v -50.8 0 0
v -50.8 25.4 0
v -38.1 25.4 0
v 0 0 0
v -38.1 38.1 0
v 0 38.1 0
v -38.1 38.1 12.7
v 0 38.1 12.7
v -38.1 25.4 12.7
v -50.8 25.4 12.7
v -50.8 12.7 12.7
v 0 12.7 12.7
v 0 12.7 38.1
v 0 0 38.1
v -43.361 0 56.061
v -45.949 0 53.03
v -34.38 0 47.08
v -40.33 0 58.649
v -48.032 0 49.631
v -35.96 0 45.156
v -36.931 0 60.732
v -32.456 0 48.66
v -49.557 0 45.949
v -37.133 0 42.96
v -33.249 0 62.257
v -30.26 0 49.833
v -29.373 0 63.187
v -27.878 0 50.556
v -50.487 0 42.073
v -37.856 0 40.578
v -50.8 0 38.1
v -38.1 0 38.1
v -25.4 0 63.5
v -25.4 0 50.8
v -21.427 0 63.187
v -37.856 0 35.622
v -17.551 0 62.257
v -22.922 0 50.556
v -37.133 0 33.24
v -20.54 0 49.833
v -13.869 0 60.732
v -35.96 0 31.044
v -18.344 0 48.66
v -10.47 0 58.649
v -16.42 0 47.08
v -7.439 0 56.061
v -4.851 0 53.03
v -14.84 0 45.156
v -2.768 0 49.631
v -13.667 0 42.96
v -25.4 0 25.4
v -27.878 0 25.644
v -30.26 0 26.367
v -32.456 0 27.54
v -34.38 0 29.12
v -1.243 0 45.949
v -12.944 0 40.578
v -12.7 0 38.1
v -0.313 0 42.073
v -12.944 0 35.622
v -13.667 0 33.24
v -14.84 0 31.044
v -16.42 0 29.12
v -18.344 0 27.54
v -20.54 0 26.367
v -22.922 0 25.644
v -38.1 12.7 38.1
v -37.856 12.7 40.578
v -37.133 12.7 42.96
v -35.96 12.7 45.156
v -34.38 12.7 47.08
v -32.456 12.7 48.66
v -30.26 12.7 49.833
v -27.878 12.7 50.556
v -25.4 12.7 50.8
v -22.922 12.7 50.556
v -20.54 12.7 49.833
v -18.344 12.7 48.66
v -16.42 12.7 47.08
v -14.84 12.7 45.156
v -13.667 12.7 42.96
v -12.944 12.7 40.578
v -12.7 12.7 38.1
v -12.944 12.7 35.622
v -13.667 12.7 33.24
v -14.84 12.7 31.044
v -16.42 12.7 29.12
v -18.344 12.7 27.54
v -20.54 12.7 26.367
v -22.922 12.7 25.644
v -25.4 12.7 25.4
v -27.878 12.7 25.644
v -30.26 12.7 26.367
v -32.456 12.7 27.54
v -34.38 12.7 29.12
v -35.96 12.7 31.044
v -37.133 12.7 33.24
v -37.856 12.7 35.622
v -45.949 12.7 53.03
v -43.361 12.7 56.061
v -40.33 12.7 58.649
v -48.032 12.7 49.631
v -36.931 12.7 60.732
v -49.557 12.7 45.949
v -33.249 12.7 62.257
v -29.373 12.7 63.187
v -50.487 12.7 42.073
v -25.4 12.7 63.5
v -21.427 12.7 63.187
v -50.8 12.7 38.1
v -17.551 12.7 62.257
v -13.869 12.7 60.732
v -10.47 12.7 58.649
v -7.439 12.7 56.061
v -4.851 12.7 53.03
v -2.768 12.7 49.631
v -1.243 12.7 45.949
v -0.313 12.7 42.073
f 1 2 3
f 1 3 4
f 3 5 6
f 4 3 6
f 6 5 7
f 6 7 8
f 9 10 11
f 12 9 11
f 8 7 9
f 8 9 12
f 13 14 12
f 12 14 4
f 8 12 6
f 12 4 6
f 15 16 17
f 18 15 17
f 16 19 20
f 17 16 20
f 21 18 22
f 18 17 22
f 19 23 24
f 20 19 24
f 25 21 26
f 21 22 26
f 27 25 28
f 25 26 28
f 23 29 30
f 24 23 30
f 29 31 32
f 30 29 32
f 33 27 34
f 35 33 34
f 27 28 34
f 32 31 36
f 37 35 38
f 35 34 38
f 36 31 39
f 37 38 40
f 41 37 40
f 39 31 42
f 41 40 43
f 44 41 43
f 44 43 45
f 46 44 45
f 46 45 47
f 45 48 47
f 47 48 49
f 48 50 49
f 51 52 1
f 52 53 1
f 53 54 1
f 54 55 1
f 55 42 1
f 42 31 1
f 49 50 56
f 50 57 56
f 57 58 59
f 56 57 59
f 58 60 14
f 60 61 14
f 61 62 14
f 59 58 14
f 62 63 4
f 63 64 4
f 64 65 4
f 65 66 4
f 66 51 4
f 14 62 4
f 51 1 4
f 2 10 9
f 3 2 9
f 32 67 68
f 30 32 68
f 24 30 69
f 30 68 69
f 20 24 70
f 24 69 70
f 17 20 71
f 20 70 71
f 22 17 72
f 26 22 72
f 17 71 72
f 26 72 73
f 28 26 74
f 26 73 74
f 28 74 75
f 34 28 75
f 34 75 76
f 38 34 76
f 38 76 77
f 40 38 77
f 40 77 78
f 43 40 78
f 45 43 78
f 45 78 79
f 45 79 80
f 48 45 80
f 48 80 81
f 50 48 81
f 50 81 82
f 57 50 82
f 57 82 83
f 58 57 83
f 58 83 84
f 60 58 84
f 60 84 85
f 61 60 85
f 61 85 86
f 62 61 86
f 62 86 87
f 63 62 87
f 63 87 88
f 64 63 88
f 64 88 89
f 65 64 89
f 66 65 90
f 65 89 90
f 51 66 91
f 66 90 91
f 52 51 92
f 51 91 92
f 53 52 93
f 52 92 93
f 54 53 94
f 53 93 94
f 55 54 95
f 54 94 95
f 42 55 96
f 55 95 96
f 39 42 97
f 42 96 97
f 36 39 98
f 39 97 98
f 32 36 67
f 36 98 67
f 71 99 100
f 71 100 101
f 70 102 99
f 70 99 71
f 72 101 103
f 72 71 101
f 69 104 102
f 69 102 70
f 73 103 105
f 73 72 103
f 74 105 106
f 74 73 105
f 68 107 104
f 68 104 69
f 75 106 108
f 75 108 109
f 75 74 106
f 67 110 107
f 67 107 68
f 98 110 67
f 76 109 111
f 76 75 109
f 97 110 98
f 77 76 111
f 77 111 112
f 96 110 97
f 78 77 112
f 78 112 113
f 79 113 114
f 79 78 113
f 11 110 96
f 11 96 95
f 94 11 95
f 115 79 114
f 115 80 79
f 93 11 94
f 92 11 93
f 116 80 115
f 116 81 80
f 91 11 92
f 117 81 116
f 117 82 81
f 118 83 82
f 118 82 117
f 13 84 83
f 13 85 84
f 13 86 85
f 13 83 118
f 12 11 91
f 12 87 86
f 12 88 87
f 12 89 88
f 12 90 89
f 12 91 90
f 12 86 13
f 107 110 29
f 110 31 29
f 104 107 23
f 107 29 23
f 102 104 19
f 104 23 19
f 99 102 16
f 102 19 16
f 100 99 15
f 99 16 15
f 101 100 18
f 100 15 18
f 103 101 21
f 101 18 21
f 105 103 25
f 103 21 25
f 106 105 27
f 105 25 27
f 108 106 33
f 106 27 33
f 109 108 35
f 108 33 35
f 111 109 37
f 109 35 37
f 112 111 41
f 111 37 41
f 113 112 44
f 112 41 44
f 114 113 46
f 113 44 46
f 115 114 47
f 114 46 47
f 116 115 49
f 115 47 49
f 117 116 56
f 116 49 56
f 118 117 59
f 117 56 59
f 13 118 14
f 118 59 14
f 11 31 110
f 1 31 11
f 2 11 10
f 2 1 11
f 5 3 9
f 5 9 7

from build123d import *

# Parameters (mm, degrees)
F0_W     = 50.8
F0_H     = 38.1
F1_DEPTH = 12.7
F2_W     = 50.8
F2_H     = 12.7
F3_DEPTH = 63.5
F4_W     = 12.7
F4_H     = 12.7
F5_DEPTH = 12.701
F6_R     = 12.7
F7_DEPTH = 12.701
F8_R     = 25.39999


# Not quite as in the source:
# - a fillet or chamfer is up to 0.001 mm smaller than in the source, because OpenCascade refuses the exact size


with BuildPart() as f1:
    # F0 (on Top) → F1 (new body)
    with BuildSketch(Plane.XY):
        with Locations((-25.4, 19.05)):
            Rectangle(F0_W, F0_H)
    extrude(amount=F1_DEPTH)

    # F2 (on face) → F3 (join)
    with BuildSketch(Plane(origin=(0, 0, 0), x_dir=(1, 0, 0), z_dir=(0, 0, -1))):
        with Locations((-25.4, -6.35)):
            Rectangle(F2_W, F2_H)
    extrude(amount=-F3_DEPTH)

    # F4 (on face) → F5 (cut, through all)
    with BuildSketch(Plane.XY.offset(12.7)):
        with Locations((-44.45, 31.75)):
            Rectangle(F4_W, F4_H)
    extrude(amount=-F5_DEPTH, mode=Mode.SUBTRACT)

    # F6 (on face) → F7 (cut, through all)
    with BuildSketch(Plane(origin=(0, 12.7, 0), x_dir=(-1, 0, 0), z_dir=(0, 1, 0))):
        with Locations((25.4, 38.1)):
            Circle(F6_R)
    extrude(amount=-F7_DEPTH, mode=Mode.SUBTRACT)

    # F8 (radius 25.4 in the source; OpenCascade refuses exactly that, so slightly less here)
    f8_edges = [f1.edges().sort_by_distance(p)[0] for p in [
        (-50.8, 6.35, 63.5),
        (0, 6.35, 63.5),
    ]]
    fillet(f8_edges, radius=F8_R)


solid = f1.part
